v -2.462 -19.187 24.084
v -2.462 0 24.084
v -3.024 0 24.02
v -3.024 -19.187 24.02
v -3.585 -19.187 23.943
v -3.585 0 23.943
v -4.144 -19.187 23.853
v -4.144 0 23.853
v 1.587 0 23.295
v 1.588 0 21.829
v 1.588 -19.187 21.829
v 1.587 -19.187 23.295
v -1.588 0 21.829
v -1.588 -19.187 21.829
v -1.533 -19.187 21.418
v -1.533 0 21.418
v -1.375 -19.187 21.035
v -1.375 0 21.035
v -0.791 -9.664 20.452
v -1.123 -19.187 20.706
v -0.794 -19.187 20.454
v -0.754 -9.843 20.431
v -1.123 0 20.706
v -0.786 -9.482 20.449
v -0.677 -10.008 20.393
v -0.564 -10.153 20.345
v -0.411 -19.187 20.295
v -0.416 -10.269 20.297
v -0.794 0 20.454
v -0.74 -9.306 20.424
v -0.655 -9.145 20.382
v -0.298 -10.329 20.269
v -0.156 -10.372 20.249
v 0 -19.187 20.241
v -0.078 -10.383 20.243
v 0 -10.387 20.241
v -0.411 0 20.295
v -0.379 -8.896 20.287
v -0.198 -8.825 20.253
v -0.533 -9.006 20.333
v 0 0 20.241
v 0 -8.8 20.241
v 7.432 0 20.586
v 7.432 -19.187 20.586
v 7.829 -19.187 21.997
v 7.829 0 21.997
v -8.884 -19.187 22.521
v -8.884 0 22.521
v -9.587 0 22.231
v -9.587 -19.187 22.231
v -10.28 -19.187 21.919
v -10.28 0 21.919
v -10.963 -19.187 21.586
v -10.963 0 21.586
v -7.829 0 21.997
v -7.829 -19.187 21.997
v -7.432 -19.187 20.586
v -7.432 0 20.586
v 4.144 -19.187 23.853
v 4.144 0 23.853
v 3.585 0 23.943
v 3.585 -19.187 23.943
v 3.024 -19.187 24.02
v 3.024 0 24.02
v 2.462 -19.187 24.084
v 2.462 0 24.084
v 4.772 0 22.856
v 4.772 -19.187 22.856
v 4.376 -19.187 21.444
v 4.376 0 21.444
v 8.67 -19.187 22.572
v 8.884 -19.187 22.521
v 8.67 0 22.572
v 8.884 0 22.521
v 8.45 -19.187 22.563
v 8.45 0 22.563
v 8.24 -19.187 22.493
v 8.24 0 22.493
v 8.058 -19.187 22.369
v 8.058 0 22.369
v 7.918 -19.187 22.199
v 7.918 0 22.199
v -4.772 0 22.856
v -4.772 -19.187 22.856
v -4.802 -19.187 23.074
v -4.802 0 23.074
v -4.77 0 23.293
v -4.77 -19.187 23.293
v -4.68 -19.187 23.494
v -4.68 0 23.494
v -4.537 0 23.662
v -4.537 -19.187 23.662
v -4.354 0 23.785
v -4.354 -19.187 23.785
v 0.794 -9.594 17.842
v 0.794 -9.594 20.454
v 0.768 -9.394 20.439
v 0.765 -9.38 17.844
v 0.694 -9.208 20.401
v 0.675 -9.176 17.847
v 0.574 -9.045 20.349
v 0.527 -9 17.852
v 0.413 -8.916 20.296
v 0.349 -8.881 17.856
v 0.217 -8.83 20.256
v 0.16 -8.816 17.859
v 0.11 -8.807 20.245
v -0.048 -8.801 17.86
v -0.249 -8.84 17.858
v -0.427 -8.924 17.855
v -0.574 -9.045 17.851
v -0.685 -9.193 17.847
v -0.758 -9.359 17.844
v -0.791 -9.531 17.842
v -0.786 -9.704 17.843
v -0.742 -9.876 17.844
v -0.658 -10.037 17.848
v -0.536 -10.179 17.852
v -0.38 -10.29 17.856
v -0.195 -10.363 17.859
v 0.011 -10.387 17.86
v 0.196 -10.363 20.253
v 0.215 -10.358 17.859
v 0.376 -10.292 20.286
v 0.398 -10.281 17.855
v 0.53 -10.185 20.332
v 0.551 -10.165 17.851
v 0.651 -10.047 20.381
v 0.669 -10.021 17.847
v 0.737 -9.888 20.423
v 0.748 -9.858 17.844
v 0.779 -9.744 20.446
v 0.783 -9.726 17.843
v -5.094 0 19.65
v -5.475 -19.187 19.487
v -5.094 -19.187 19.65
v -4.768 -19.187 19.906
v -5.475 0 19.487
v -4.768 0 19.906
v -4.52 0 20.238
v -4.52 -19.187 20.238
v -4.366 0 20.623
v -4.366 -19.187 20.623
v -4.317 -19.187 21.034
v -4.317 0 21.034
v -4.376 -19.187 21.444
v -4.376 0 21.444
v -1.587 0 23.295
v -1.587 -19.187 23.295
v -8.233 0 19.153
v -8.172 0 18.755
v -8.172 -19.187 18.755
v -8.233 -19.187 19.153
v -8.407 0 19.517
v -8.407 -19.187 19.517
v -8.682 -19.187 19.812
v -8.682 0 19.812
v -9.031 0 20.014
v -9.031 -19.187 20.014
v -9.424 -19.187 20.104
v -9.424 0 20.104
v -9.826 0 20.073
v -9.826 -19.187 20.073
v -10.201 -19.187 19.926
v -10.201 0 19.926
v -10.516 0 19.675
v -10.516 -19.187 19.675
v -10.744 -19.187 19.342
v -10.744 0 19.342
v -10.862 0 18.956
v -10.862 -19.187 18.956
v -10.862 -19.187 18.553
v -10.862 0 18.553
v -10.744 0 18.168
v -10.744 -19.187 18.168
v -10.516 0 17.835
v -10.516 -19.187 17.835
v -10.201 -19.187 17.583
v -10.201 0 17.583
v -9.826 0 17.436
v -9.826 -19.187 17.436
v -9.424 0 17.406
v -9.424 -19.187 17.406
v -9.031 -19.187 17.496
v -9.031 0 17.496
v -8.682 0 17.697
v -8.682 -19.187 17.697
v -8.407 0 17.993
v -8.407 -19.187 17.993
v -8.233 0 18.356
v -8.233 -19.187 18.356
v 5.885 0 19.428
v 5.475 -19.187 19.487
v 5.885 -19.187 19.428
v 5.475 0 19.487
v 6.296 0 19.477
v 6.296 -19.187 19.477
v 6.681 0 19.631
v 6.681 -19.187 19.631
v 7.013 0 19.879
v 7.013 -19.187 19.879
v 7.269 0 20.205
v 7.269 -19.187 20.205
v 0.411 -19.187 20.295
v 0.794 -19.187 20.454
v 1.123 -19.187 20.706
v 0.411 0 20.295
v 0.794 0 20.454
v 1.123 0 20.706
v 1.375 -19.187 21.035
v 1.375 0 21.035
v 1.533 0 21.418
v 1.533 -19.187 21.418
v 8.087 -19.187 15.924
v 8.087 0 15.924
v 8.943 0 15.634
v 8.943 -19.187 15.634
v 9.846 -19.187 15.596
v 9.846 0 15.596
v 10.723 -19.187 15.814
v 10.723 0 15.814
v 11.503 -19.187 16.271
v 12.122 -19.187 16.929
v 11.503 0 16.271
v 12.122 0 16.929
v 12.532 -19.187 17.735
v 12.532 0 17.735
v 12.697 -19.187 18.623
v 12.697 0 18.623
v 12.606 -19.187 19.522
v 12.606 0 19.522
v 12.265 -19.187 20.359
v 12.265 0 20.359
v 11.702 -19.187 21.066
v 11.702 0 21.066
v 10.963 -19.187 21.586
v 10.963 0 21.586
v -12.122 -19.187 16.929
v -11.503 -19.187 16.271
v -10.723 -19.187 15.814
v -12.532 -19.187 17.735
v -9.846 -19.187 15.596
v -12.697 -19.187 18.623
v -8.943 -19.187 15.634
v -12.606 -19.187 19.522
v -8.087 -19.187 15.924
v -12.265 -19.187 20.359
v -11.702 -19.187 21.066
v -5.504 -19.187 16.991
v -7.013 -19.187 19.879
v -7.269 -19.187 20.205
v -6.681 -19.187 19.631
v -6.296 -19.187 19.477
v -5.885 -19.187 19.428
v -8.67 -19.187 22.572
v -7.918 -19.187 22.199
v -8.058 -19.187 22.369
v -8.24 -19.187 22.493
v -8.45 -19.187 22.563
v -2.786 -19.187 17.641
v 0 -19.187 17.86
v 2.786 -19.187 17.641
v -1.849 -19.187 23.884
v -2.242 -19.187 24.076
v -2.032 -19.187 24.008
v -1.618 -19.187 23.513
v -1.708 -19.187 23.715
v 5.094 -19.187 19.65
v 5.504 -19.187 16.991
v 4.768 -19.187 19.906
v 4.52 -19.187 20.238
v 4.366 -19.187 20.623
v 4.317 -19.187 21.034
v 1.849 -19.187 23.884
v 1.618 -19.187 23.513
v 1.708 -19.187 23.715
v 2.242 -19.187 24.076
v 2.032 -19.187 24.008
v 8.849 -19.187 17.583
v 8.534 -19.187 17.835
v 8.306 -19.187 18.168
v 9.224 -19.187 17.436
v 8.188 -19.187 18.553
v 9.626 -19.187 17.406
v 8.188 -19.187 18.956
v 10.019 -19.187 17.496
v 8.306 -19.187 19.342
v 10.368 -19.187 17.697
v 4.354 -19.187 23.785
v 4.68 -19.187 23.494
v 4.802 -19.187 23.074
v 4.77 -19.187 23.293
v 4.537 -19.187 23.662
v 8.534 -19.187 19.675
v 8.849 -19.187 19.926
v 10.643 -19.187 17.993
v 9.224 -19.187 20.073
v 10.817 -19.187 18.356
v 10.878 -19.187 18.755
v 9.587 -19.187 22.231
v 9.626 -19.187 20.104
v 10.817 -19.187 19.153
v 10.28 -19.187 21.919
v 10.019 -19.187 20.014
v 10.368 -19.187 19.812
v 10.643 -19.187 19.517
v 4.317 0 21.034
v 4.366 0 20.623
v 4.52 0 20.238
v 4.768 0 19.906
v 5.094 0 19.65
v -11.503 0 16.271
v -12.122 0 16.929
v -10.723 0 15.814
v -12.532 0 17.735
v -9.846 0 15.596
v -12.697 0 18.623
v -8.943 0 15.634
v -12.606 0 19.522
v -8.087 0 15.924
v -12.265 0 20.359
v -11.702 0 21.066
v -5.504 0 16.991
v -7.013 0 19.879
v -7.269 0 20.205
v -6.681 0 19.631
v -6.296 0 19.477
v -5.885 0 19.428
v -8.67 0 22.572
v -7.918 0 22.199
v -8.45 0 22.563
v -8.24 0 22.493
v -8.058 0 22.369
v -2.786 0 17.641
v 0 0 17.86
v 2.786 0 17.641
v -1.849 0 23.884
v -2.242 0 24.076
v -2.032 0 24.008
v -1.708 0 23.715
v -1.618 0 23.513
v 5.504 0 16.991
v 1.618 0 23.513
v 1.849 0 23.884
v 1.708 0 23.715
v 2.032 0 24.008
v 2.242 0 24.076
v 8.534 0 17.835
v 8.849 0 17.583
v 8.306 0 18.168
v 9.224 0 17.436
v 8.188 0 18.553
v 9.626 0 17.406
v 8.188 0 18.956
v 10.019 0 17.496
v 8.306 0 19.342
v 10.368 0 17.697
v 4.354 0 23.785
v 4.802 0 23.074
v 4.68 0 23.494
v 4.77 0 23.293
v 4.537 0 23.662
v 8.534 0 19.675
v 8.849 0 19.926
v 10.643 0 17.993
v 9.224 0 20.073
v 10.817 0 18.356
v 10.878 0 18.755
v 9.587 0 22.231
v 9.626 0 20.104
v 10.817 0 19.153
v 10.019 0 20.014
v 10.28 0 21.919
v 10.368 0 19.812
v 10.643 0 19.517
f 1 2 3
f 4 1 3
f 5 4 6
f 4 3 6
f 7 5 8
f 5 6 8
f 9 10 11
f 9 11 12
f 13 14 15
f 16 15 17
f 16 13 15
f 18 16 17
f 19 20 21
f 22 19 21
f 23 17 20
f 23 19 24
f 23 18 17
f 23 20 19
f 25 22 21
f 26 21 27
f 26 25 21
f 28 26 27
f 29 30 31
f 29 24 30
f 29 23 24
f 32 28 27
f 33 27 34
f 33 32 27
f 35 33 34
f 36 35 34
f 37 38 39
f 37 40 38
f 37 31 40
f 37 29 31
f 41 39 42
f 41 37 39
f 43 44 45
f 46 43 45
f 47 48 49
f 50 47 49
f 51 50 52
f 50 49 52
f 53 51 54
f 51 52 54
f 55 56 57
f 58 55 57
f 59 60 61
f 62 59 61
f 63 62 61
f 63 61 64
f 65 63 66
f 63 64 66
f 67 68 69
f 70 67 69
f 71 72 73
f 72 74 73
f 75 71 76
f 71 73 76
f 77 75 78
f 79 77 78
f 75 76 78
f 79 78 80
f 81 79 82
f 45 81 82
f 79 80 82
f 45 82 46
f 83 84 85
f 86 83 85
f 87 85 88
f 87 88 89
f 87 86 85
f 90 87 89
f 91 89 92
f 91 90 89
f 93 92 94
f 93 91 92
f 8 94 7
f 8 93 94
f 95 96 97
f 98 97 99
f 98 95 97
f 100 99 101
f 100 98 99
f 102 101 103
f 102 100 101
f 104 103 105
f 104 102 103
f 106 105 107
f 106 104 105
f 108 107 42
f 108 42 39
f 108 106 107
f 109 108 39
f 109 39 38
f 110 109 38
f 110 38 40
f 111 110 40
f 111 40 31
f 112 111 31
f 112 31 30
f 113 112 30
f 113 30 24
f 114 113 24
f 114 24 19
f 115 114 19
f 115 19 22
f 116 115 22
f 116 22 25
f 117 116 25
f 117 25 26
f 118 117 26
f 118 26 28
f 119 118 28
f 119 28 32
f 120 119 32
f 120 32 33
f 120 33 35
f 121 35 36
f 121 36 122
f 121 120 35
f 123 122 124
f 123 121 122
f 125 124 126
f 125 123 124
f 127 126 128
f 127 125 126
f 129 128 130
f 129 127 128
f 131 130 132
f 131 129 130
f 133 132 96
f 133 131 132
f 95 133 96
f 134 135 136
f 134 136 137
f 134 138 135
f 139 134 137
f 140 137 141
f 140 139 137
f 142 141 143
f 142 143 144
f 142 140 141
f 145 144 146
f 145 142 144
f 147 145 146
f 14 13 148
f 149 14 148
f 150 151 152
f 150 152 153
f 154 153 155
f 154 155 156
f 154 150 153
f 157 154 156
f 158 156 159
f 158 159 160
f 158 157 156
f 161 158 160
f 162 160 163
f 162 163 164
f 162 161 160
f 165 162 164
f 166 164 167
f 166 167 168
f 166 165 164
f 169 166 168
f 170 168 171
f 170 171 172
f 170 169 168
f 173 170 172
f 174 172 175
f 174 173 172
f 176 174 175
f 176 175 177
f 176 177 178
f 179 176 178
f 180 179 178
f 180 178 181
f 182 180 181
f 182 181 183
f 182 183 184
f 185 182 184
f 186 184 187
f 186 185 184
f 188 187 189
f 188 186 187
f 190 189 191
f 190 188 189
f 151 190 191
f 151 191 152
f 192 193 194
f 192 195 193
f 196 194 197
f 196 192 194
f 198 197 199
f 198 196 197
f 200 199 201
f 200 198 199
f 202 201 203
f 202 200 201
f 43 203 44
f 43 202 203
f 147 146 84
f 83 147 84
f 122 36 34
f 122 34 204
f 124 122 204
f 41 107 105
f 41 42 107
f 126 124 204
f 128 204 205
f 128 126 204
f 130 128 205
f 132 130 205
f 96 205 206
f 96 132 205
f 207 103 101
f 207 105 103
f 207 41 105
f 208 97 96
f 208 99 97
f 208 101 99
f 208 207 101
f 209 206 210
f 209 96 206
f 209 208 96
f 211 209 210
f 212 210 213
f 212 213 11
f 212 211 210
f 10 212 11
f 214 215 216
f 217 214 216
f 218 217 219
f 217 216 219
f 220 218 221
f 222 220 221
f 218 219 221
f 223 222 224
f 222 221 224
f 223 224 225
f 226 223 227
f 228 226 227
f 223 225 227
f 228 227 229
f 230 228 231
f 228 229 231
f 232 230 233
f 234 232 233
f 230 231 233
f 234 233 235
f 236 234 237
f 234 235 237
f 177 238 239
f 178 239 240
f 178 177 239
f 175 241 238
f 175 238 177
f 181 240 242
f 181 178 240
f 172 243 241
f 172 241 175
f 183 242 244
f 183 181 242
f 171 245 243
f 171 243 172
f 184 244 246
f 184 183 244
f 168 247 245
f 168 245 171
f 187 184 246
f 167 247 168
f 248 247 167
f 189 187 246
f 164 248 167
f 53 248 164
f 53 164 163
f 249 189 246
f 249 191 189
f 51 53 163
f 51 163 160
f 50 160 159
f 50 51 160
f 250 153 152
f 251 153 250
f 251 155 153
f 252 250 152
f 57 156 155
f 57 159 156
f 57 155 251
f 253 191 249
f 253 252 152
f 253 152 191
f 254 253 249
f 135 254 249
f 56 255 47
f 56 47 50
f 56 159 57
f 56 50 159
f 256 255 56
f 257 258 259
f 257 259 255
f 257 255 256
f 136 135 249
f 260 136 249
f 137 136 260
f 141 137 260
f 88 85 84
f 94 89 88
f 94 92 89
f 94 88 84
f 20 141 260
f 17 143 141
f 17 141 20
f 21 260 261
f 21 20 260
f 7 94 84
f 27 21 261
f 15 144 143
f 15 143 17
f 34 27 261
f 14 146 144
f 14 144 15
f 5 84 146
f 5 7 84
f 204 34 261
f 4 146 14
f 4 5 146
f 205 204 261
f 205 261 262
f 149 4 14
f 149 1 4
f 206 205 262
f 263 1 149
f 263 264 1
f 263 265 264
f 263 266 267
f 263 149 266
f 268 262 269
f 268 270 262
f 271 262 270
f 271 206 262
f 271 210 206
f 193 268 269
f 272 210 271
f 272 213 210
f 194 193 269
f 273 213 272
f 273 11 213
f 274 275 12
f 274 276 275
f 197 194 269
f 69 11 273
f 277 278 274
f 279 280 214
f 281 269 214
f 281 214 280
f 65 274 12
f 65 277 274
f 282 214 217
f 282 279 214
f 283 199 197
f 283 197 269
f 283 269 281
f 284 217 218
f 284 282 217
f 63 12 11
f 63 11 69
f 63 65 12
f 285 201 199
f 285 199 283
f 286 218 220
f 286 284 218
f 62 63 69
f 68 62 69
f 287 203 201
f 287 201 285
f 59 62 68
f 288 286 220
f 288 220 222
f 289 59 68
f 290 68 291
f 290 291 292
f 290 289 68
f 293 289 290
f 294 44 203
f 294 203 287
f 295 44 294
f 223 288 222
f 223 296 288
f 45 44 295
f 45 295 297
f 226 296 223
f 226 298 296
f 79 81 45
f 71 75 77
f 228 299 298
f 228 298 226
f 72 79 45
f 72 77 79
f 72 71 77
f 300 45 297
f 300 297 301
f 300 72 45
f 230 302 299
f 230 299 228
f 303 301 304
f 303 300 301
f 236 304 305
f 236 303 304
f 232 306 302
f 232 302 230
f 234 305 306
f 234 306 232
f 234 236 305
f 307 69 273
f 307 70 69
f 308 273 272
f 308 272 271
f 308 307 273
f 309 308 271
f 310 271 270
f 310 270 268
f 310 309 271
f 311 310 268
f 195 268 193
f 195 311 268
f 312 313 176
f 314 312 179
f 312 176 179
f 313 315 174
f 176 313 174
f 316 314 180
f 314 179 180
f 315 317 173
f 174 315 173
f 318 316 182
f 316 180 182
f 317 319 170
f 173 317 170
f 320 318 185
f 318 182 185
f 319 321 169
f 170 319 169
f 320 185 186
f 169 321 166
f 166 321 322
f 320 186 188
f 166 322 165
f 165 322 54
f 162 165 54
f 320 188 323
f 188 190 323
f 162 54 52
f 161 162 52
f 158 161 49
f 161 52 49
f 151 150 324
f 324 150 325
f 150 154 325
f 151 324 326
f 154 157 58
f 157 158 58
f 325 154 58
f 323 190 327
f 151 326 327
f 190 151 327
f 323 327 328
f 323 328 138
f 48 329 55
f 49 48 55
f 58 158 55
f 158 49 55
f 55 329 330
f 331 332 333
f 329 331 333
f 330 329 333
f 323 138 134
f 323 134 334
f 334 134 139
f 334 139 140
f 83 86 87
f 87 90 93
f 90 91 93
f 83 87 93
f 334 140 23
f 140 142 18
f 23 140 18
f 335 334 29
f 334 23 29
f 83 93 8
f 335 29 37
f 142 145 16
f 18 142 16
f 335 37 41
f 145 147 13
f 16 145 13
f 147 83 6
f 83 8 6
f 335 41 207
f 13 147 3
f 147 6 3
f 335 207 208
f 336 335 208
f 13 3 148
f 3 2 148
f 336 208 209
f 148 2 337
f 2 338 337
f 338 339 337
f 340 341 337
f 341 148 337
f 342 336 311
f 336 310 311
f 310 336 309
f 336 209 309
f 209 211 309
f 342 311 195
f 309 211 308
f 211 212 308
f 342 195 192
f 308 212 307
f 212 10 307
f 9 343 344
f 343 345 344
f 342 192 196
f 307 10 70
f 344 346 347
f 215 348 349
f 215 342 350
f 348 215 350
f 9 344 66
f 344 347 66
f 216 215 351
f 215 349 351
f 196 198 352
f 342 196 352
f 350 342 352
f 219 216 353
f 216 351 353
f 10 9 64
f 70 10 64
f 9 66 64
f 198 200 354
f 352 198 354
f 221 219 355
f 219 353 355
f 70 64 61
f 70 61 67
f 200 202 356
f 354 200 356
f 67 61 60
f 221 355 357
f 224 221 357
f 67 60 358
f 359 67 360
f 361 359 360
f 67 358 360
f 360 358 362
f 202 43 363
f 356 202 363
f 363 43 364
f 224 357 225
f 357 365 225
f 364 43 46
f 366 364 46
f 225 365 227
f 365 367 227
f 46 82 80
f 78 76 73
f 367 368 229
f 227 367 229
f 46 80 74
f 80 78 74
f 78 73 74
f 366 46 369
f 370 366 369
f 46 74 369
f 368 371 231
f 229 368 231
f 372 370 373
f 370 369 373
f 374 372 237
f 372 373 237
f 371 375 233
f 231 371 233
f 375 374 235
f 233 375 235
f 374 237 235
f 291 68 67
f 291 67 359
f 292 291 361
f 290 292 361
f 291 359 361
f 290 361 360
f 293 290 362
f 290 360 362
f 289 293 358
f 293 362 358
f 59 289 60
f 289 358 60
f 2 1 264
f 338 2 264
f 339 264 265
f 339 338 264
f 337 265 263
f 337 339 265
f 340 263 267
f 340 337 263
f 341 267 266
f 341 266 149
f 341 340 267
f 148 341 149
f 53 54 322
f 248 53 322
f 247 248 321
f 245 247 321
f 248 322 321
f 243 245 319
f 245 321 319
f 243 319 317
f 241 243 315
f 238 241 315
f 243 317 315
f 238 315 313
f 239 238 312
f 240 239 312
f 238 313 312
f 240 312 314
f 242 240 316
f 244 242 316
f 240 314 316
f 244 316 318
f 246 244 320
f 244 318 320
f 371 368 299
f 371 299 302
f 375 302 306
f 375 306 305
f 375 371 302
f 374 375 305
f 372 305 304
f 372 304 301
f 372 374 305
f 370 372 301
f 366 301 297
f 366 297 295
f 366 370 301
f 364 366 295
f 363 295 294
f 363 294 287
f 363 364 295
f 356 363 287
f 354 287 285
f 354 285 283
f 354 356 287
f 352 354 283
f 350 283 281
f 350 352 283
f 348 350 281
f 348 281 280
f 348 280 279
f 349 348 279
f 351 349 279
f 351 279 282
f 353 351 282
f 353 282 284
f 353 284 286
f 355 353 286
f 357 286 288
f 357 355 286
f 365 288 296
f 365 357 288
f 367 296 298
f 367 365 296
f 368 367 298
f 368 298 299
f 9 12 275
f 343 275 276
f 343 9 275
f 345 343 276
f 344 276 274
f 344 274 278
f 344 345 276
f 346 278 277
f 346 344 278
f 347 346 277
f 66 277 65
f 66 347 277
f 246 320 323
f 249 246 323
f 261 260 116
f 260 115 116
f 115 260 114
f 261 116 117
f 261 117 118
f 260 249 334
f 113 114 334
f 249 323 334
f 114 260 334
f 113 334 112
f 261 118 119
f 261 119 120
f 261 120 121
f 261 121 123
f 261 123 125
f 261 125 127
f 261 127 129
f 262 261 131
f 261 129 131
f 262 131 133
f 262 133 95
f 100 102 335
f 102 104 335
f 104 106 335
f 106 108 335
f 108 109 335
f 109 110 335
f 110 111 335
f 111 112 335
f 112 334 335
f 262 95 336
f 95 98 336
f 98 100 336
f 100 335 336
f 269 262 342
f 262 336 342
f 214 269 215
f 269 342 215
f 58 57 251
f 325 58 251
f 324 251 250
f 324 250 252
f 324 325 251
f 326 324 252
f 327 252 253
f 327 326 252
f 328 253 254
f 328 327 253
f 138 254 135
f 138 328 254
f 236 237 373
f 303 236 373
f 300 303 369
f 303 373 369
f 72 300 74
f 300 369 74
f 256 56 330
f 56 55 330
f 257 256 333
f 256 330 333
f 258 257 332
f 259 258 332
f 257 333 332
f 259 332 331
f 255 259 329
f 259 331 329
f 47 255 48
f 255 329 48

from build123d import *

# Parameters (mm, degrees)
F0_R     = 1.35255
F1_DEPTH = 19.18716
F2_W     = 3.175
F2_H     = 3.96875
F3_DEPTH = 19.18716
F4_R     = 1.58749
F5_R     = 0.79375
F6_R     = 0.79375
F7_DEPTH = 55


# Not quite as in the source:
# - a fillet or chamfer is up to 0.001 mm smaller than in the source, because OpenCascade refuses the exact size
# - an extrude ends at something that could not be found from the text; its depth is read off the source's solid


with BuildPart() as f1:
    # F0 (on Front) → F1 (new body)
    with BuildSketch(Plane.XZ):
        with BuildLine():
            ThreePointArc((-8.0873006088, 15.9239409983), (0, 17.8599084), (8.0873006088, 15.9239409983))
            ThreePointArc((8.0873006088, 15.9239409983), (12.3558382964, 17.3170799036), (10.9626993912, 21.5856175912))
            ThreePointArc((10.9626993912, 21.5856175912), (0, 24.2099084), (-10.9626993912, 21.5856175912))
            ThreePointArc((-10.9626993912, 21.5856175912), (-12.3558382964, 17.3170799036), (-8.0873006088, 15.9239409983))
        make_face()
        with Locations((-9.525, 18.7547792948)):
            Circle(F0_R, mode=Mode.SUBTRACT)
        with Locations((9.525, 18.7547792948)):
            Circle(F0_R, mode=Mode.SUBTRACT)
    extrude(amount=F1_DEPTH)

    # F2 (on face) → F3 (cut, through all)
    with BuildSketch(Plane.XZ.offset(19.18716)):
        Polygon((-8.0765705738, 22.8781299226), (-7.0031118134, 19.0573102654), (-3.9464560877, 19.9160772737), (-5.0199148481, 23.7368969308), align=None)
        Polygon((8.0765705738, 22.8781299226), (5.0199148481, 23.7368969308), (3.9464560877, 19.9160772737), (7.0031118134, 19.0573102654), align=None)
        with Locations((0, 22.2255334)):
            Rectangle(F2_W, F2_H)
    extrude(amount=-F3_DEPTH, mode=Mode.SUBTRACT)

    # F4 (radius 1.5875 in the source; OpenCascade refuses exactly that, so slightly less here)
    f4_edges = [f1.edges().sort_by_distance(p)[0] for p in [
        (-7.003112, -9.59358, 19.05731),
        (-3.946456, -9.59358, 19.916077),
        (-1.5875, -9.59358, 20.241158),
        (1.5875, -9.59358, 20.241158),
        (3.946456, -9.59358, 19.916077),
        (7.003112, -9.59358, 19.05731),
    ]]
    fillet(f4_edges, radius=F4_R)

    # F5
    f5_edges = [f1.edges().sort_by_distance(p)[0] for p in [
        (-8.062478, -9.59358, 22.827968),
        (-5.005822, -9.59358, 23.686735),
        (-1.5875, -9.59358, 24.157804),
        (1.5875, -9.59358, 24.157804),
        (5.005822, -9.59358, 23.686735),
        (8.062478, -9.59358, 22.827968),
    ]]
    fillet(f5_edges, radius=F5_R)

    # F6 (on Top) → F7 (cut, through all)
    with BuildSketch(Plane.XY):
        with Locations((0, -9.59358)):
            Circle(F6_R)
    extrude(amount=F7_DEPTH, mode=Mode.SUBTRACT)


solid = f1.part
